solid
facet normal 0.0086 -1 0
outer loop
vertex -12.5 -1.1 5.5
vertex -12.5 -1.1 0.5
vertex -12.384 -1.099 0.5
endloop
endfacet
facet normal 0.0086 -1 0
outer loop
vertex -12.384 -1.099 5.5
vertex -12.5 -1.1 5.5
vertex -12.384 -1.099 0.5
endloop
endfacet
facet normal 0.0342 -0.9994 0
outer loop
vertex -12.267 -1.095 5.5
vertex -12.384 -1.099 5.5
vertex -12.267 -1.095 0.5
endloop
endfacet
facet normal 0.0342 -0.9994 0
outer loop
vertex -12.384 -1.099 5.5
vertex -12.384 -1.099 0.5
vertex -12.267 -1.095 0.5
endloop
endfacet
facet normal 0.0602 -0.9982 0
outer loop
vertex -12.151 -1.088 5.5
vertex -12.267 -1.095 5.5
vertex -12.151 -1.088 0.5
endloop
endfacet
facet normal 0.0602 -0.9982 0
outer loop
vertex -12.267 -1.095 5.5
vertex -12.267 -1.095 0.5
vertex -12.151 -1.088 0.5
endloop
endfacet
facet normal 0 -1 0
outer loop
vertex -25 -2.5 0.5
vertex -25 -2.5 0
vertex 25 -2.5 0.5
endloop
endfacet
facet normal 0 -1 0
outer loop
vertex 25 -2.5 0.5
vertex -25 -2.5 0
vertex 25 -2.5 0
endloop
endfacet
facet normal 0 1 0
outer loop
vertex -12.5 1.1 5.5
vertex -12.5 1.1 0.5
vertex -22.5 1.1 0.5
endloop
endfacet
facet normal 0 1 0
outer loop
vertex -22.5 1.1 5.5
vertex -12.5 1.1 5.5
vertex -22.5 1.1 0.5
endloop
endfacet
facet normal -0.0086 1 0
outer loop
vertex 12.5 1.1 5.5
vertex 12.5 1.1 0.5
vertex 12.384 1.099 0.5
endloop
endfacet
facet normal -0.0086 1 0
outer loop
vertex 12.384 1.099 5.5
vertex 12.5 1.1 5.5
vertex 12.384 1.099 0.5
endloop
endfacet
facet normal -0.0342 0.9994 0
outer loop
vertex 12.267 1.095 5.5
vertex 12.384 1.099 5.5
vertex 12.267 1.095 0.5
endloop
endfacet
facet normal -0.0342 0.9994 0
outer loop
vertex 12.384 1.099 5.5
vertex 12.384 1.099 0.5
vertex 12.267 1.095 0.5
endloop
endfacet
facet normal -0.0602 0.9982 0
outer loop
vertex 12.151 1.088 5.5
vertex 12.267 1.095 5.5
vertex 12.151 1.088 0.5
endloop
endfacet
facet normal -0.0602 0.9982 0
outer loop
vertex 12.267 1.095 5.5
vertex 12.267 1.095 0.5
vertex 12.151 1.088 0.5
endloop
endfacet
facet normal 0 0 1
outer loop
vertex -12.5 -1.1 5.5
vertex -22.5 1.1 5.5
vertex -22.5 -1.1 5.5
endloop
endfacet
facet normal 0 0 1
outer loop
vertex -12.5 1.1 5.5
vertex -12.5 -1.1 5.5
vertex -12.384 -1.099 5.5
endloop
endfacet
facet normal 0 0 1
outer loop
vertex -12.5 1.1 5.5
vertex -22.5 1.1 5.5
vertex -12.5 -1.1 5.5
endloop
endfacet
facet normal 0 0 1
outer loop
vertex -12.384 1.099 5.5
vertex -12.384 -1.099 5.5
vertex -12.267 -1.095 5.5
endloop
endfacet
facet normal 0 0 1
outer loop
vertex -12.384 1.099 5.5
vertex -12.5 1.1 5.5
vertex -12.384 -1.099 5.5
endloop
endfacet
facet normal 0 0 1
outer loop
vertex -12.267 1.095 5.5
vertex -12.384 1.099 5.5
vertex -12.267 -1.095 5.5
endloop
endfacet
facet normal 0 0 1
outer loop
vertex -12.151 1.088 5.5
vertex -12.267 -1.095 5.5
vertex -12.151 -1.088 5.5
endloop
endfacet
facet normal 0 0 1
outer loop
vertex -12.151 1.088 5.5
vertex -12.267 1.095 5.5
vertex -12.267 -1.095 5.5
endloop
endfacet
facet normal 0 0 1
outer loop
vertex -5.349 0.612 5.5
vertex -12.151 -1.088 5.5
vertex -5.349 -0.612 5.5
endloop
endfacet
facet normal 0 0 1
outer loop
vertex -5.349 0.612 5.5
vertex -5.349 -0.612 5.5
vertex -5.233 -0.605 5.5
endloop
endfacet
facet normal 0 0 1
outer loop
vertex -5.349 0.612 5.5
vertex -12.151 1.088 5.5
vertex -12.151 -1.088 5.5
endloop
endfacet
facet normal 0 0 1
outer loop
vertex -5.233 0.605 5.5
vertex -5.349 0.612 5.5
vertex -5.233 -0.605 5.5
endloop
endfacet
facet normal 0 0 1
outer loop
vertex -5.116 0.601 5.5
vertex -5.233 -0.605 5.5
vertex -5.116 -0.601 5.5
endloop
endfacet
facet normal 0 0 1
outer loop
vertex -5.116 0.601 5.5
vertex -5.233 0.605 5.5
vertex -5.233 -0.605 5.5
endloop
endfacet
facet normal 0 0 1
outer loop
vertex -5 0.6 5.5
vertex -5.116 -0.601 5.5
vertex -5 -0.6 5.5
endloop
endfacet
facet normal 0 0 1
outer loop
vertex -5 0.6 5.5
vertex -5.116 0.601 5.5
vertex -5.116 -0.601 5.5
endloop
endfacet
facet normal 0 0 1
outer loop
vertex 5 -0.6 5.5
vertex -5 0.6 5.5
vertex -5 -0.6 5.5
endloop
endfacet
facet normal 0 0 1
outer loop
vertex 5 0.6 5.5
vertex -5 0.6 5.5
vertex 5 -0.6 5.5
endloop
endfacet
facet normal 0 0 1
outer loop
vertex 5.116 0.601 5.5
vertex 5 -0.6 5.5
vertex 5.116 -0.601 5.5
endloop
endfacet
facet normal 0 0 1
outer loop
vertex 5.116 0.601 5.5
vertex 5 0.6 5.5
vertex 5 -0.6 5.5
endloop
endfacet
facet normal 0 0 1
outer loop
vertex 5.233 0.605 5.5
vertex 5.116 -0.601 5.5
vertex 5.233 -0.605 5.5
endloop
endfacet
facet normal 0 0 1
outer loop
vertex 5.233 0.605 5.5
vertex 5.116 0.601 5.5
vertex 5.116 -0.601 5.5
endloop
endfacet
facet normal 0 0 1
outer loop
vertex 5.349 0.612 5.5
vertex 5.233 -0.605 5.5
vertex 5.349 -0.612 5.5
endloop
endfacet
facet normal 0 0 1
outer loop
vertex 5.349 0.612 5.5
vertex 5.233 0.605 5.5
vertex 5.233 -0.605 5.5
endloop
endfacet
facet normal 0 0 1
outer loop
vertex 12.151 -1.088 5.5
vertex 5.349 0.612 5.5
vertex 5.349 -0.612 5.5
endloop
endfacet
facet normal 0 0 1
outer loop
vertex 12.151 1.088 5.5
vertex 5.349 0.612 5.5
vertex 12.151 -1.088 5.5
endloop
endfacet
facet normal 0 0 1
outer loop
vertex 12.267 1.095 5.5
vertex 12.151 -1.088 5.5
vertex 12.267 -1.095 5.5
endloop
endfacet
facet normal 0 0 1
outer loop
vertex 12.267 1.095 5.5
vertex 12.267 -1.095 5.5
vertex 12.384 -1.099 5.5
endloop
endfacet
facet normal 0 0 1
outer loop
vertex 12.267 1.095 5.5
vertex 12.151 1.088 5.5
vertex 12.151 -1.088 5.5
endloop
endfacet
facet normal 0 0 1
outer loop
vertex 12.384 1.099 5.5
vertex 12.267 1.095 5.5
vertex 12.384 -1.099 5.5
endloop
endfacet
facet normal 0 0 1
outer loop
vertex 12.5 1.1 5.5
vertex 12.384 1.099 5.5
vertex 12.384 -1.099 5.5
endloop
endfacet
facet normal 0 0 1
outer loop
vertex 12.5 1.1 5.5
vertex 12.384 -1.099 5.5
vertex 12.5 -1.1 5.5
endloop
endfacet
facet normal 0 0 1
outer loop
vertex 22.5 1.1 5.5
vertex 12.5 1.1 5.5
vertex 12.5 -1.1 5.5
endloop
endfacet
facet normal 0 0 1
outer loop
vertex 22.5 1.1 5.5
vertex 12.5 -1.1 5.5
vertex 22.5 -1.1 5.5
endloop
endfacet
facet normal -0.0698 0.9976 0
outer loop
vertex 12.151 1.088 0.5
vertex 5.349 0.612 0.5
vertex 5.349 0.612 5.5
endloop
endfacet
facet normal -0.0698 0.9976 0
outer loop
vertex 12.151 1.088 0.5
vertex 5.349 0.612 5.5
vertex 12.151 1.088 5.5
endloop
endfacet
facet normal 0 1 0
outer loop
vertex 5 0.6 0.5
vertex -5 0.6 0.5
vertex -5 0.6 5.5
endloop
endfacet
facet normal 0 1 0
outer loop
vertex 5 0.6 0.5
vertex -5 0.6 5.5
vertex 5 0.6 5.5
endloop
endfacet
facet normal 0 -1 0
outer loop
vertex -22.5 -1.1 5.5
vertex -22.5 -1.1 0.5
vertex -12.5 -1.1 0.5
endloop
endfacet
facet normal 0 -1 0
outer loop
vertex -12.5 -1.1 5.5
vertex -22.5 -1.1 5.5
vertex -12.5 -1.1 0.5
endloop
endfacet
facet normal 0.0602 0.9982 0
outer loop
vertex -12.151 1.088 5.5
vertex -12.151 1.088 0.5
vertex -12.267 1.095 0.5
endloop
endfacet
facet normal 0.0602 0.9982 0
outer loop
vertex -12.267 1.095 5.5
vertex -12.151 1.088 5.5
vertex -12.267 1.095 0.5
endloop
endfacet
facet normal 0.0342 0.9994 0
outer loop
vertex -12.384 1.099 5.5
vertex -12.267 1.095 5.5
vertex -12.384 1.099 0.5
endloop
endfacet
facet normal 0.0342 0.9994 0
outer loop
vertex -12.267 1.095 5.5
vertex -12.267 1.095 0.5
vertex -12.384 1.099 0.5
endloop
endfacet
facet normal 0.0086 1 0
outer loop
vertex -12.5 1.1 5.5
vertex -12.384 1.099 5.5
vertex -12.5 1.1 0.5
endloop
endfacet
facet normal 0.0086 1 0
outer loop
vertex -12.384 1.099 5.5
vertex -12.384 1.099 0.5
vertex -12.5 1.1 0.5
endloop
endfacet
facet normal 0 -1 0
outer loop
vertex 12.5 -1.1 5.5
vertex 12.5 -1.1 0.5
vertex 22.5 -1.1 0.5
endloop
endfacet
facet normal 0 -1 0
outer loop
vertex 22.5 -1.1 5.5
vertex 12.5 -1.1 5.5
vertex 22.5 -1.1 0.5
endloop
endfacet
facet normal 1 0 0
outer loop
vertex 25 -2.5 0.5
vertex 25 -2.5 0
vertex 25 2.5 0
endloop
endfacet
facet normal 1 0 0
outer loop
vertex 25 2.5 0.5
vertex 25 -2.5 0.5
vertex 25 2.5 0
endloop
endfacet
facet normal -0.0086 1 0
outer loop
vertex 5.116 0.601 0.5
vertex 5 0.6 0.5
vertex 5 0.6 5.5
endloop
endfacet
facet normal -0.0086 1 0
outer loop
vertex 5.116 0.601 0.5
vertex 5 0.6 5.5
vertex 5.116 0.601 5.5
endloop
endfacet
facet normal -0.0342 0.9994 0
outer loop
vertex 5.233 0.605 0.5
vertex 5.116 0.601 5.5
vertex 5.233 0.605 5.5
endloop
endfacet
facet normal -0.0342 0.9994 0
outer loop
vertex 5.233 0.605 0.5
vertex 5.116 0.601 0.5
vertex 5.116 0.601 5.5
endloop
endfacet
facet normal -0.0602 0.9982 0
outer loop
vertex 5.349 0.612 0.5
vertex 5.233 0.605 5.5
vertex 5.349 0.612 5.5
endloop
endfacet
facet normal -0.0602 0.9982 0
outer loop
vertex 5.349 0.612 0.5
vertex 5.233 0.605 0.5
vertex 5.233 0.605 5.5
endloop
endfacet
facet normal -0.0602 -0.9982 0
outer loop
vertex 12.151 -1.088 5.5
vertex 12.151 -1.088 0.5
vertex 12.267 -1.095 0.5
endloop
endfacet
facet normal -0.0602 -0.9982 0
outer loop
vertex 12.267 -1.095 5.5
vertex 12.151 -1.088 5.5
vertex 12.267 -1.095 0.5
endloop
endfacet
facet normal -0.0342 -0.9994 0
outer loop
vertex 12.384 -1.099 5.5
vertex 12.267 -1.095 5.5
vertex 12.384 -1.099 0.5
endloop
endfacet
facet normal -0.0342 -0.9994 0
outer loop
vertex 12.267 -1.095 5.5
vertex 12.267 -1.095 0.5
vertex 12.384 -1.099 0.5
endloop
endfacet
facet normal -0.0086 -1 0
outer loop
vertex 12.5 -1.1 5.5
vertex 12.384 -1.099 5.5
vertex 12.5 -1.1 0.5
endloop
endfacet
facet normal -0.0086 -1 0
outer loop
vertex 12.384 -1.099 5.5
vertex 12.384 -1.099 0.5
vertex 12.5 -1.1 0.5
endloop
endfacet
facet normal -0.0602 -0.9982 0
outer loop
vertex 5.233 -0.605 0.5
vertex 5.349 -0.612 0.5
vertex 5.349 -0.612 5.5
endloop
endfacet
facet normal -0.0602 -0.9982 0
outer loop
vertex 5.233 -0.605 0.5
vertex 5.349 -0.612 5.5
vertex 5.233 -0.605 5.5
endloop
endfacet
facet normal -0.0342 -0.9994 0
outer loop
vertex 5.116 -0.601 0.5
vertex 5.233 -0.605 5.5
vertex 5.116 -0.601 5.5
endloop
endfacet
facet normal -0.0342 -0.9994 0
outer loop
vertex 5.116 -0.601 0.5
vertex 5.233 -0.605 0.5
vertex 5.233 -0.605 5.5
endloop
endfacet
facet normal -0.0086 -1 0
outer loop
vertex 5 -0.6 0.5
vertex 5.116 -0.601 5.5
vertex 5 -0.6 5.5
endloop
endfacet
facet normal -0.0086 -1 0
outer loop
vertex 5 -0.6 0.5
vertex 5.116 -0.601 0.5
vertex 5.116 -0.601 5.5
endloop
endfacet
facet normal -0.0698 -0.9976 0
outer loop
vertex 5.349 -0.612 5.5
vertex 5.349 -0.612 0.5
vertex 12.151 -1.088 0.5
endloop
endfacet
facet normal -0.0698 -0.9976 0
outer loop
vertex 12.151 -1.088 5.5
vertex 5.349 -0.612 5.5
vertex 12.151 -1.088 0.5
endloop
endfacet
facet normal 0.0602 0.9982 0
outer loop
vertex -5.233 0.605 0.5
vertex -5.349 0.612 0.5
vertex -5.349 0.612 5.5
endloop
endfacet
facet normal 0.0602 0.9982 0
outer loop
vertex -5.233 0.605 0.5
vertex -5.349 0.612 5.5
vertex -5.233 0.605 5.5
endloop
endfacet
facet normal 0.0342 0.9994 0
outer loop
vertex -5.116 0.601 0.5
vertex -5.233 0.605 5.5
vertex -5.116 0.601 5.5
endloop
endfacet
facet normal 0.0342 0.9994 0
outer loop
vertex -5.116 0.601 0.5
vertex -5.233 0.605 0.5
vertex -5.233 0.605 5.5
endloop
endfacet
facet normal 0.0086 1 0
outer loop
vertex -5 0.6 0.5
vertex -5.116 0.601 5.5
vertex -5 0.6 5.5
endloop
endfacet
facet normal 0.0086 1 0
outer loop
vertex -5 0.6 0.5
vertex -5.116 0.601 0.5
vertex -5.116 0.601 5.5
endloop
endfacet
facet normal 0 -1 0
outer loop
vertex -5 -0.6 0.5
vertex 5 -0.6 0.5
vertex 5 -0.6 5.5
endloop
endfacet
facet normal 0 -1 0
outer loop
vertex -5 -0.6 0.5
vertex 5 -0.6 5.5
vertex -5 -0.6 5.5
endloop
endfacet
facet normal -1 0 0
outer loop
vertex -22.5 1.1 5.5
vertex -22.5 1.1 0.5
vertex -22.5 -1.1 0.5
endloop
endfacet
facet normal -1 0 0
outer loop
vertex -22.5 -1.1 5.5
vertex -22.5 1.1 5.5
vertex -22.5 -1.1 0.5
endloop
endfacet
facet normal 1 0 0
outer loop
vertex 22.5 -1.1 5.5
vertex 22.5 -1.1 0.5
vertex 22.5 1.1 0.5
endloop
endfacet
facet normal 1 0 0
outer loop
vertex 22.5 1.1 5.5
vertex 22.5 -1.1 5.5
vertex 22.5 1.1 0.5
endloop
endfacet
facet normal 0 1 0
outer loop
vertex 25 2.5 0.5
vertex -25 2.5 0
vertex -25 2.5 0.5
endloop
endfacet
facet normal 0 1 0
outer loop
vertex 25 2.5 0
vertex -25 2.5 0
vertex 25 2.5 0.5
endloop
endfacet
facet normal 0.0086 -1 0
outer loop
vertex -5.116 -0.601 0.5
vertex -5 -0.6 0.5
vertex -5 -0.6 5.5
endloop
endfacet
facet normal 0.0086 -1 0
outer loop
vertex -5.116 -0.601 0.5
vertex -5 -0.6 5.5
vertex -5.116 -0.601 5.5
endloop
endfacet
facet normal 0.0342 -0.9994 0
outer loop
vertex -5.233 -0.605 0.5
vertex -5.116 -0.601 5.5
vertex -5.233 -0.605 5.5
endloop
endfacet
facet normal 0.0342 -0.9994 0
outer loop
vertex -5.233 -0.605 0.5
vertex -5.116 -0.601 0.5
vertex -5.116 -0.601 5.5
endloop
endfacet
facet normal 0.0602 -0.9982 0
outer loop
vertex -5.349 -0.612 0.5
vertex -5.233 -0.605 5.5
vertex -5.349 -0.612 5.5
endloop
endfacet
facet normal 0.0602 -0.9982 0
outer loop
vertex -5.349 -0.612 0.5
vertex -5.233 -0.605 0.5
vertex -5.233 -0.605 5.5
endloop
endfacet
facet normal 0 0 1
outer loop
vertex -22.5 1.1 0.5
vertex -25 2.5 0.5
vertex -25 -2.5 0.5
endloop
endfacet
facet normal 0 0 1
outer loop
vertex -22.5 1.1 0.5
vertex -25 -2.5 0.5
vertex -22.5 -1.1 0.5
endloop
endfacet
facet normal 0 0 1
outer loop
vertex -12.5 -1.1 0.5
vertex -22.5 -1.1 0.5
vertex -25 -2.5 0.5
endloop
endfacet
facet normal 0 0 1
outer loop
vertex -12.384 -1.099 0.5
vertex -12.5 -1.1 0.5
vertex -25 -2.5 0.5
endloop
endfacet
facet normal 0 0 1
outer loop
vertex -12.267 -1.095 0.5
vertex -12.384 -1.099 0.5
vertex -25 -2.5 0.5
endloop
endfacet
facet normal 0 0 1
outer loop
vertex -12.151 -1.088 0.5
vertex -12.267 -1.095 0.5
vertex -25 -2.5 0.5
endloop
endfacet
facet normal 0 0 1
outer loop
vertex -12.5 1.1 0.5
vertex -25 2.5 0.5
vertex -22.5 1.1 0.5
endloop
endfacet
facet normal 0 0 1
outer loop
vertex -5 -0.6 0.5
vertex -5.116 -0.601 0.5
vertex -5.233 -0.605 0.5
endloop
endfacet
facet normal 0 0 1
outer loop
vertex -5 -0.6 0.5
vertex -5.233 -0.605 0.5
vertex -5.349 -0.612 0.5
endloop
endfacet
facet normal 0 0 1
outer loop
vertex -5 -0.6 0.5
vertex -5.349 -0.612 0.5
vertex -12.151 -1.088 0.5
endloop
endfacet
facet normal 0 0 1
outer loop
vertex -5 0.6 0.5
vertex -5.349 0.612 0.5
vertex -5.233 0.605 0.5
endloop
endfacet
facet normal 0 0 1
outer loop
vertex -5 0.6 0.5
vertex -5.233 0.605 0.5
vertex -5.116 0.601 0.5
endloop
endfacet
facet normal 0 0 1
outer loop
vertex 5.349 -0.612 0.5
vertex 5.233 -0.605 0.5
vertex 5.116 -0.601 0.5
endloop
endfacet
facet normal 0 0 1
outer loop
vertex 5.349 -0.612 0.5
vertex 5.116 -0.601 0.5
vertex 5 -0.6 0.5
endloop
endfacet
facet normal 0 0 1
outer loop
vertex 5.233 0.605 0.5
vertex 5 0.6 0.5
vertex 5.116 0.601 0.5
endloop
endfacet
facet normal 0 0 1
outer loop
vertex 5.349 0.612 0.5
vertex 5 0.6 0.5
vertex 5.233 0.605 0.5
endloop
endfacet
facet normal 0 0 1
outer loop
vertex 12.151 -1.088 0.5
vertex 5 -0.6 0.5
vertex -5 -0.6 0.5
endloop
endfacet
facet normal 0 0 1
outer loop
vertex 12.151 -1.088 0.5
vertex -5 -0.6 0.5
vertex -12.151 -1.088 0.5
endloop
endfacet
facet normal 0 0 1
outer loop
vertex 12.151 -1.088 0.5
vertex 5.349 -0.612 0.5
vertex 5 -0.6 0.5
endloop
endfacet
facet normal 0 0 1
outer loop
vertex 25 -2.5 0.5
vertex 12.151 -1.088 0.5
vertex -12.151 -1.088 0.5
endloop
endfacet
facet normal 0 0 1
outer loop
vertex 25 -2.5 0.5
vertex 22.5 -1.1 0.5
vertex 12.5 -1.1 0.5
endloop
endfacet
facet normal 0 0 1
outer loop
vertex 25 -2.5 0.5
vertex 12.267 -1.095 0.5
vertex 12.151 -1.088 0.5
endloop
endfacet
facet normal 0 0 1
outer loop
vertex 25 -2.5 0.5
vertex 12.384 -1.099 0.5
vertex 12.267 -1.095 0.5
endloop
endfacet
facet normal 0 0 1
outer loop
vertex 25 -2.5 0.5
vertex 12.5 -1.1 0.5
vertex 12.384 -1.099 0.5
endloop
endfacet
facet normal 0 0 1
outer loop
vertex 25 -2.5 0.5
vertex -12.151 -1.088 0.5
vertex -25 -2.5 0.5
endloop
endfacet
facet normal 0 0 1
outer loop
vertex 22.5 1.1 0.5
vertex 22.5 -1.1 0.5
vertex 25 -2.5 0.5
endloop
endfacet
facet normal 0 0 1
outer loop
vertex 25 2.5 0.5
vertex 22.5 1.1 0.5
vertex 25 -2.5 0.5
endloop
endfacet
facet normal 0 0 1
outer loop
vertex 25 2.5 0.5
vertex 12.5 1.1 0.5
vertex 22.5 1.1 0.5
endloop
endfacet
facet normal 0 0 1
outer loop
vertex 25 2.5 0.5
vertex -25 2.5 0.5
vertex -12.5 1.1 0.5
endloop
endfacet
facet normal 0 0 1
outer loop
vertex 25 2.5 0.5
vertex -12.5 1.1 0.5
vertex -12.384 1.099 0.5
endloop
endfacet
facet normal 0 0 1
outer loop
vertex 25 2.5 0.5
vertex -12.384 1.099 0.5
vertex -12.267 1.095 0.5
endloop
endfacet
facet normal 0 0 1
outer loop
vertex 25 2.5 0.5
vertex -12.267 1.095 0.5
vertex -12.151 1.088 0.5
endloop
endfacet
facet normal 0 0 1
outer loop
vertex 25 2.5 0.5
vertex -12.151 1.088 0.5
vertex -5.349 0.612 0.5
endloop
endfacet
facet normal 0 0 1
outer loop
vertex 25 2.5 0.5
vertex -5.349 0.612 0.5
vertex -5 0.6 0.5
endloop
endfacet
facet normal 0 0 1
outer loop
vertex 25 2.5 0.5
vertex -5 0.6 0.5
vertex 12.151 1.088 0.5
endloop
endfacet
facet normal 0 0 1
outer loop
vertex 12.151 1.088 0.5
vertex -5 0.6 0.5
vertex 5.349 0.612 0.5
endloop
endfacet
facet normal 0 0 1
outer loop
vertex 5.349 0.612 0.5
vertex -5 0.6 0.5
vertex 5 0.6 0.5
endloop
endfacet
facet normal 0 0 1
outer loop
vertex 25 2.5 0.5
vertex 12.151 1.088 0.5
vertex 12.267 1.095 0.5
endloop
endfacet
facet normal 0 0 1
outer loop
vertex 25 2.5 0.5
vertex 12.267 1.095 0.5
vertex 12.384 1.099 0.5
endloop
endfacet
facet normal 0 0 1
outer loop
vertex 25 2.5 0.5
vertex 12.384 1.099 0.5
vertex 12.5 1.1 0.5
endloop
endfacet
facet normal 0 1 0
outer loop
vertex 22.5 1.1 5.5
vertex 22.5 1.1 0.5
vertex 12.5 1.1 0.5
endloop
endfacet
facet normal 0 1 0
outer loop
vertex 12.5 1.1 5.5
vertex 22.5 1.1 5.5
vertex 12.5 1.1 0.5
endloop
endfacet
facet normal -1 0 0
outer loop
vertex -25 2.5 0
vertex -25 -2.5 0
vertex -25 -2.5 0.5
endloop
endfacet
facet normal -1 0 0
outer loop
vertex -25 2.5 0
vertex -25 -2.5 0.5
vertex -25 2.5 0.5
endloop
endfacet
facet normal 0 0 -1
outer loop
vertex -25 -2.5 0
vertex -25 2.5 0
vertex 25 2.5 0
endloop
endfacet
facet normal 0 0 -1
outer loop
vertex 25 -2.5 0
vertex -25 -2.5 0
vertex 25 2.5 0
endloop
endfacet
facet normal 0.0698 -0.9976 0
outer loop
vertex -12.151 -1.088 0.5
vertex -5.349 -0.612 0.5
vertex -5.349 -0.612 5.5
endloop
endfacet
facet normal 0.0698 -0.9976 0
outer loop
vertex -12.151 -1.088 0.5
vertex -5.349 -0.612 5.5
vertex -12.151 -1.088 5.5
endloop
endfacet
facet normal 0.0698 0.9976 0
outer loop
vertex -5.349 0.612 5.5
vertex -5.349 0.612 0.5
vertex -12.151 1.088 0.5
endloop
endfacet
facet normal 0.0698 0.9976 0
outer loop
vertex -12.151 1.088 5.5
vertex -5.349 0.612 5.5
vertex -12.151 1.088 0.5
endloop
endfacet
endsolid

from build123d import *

# Parameters (mm, degrees)
SKETCH_W     = 50
SKETCH_H     = 5
PAD_DEPTH    = 0.5
PAD001_DEPTH = 5


with BuildPart() as part:
    # Sketch → Pad (new body)
    with BuildSketch(Plane.XY):
        Rectangle(SKETCH_W, SKETCH_H)
    extrude(amount=PAD_DEPTH)

    # Sketch001 (on Face6 of Pad) → Pad001 (join)
    with BuildSketch(Plane.XY.offset(0.5)):
        with BuildLine():
            Line((-12.5, 1.1), (-22.5, 1.1))
            Line((-22.5, 1.1), (-22.5, -1.1))
            Line((-22.5, -1.1), (-12.5, -1.1))
            ThreePointArc((-12.5, -1.1), (-12.325514, -1.096955), (-12.151241, -1.087822))
            Line((-5.348759, -0.612178), (-12.151241, -1.087822))
            ThreePointArc((-5, -0.6), (-5.174486, -0.603045), (-5.348759, -0.612178))
            Line((5, -0.6), (-5, -0.6))
            ThreePointArc((5.348759, -0.612178), (5.174486, -0.603045), (5, -0.6))
            Line((5.348759, -0.612178), (12.151241, -1.087822))
            ThreePointArc((12.151241, -1.087822), (12.325514, -1.096955), (12.5, -1.1))
            Line((12.5, -1.1), (22.5, -1.1))
            Line((22.5, -1.1), (22.5, 1.1))
            Line((22.5, 1.1), (12.5, 1.1))
            ThreePointArc((12.5, 1.1), (12.325514, 1.096955), (12.151241, 1.087822))
            Line((5.348759, 0.612178), (12.151241, 1.087822))
            ThreePointArc((5, 0.6), (5.174486, 0.603045), (5.348759, 0.612178))
            Line((-5, 0.6), (5, 0.6))
            ThreePointArc((-5.348759, 0.612178), (-5.174486, 0.603045), (-5, 0.6))
            Line((-5.348759, 0.612178), (-12.151241, 1.087822))
            ThreePointArc((-12.151241, 1.087822), (-12.325514, 1.096955), (-12.5, 1.1))
        make_face()
    extrude(amount=PAD001_DEPTH)


solid = part.part
